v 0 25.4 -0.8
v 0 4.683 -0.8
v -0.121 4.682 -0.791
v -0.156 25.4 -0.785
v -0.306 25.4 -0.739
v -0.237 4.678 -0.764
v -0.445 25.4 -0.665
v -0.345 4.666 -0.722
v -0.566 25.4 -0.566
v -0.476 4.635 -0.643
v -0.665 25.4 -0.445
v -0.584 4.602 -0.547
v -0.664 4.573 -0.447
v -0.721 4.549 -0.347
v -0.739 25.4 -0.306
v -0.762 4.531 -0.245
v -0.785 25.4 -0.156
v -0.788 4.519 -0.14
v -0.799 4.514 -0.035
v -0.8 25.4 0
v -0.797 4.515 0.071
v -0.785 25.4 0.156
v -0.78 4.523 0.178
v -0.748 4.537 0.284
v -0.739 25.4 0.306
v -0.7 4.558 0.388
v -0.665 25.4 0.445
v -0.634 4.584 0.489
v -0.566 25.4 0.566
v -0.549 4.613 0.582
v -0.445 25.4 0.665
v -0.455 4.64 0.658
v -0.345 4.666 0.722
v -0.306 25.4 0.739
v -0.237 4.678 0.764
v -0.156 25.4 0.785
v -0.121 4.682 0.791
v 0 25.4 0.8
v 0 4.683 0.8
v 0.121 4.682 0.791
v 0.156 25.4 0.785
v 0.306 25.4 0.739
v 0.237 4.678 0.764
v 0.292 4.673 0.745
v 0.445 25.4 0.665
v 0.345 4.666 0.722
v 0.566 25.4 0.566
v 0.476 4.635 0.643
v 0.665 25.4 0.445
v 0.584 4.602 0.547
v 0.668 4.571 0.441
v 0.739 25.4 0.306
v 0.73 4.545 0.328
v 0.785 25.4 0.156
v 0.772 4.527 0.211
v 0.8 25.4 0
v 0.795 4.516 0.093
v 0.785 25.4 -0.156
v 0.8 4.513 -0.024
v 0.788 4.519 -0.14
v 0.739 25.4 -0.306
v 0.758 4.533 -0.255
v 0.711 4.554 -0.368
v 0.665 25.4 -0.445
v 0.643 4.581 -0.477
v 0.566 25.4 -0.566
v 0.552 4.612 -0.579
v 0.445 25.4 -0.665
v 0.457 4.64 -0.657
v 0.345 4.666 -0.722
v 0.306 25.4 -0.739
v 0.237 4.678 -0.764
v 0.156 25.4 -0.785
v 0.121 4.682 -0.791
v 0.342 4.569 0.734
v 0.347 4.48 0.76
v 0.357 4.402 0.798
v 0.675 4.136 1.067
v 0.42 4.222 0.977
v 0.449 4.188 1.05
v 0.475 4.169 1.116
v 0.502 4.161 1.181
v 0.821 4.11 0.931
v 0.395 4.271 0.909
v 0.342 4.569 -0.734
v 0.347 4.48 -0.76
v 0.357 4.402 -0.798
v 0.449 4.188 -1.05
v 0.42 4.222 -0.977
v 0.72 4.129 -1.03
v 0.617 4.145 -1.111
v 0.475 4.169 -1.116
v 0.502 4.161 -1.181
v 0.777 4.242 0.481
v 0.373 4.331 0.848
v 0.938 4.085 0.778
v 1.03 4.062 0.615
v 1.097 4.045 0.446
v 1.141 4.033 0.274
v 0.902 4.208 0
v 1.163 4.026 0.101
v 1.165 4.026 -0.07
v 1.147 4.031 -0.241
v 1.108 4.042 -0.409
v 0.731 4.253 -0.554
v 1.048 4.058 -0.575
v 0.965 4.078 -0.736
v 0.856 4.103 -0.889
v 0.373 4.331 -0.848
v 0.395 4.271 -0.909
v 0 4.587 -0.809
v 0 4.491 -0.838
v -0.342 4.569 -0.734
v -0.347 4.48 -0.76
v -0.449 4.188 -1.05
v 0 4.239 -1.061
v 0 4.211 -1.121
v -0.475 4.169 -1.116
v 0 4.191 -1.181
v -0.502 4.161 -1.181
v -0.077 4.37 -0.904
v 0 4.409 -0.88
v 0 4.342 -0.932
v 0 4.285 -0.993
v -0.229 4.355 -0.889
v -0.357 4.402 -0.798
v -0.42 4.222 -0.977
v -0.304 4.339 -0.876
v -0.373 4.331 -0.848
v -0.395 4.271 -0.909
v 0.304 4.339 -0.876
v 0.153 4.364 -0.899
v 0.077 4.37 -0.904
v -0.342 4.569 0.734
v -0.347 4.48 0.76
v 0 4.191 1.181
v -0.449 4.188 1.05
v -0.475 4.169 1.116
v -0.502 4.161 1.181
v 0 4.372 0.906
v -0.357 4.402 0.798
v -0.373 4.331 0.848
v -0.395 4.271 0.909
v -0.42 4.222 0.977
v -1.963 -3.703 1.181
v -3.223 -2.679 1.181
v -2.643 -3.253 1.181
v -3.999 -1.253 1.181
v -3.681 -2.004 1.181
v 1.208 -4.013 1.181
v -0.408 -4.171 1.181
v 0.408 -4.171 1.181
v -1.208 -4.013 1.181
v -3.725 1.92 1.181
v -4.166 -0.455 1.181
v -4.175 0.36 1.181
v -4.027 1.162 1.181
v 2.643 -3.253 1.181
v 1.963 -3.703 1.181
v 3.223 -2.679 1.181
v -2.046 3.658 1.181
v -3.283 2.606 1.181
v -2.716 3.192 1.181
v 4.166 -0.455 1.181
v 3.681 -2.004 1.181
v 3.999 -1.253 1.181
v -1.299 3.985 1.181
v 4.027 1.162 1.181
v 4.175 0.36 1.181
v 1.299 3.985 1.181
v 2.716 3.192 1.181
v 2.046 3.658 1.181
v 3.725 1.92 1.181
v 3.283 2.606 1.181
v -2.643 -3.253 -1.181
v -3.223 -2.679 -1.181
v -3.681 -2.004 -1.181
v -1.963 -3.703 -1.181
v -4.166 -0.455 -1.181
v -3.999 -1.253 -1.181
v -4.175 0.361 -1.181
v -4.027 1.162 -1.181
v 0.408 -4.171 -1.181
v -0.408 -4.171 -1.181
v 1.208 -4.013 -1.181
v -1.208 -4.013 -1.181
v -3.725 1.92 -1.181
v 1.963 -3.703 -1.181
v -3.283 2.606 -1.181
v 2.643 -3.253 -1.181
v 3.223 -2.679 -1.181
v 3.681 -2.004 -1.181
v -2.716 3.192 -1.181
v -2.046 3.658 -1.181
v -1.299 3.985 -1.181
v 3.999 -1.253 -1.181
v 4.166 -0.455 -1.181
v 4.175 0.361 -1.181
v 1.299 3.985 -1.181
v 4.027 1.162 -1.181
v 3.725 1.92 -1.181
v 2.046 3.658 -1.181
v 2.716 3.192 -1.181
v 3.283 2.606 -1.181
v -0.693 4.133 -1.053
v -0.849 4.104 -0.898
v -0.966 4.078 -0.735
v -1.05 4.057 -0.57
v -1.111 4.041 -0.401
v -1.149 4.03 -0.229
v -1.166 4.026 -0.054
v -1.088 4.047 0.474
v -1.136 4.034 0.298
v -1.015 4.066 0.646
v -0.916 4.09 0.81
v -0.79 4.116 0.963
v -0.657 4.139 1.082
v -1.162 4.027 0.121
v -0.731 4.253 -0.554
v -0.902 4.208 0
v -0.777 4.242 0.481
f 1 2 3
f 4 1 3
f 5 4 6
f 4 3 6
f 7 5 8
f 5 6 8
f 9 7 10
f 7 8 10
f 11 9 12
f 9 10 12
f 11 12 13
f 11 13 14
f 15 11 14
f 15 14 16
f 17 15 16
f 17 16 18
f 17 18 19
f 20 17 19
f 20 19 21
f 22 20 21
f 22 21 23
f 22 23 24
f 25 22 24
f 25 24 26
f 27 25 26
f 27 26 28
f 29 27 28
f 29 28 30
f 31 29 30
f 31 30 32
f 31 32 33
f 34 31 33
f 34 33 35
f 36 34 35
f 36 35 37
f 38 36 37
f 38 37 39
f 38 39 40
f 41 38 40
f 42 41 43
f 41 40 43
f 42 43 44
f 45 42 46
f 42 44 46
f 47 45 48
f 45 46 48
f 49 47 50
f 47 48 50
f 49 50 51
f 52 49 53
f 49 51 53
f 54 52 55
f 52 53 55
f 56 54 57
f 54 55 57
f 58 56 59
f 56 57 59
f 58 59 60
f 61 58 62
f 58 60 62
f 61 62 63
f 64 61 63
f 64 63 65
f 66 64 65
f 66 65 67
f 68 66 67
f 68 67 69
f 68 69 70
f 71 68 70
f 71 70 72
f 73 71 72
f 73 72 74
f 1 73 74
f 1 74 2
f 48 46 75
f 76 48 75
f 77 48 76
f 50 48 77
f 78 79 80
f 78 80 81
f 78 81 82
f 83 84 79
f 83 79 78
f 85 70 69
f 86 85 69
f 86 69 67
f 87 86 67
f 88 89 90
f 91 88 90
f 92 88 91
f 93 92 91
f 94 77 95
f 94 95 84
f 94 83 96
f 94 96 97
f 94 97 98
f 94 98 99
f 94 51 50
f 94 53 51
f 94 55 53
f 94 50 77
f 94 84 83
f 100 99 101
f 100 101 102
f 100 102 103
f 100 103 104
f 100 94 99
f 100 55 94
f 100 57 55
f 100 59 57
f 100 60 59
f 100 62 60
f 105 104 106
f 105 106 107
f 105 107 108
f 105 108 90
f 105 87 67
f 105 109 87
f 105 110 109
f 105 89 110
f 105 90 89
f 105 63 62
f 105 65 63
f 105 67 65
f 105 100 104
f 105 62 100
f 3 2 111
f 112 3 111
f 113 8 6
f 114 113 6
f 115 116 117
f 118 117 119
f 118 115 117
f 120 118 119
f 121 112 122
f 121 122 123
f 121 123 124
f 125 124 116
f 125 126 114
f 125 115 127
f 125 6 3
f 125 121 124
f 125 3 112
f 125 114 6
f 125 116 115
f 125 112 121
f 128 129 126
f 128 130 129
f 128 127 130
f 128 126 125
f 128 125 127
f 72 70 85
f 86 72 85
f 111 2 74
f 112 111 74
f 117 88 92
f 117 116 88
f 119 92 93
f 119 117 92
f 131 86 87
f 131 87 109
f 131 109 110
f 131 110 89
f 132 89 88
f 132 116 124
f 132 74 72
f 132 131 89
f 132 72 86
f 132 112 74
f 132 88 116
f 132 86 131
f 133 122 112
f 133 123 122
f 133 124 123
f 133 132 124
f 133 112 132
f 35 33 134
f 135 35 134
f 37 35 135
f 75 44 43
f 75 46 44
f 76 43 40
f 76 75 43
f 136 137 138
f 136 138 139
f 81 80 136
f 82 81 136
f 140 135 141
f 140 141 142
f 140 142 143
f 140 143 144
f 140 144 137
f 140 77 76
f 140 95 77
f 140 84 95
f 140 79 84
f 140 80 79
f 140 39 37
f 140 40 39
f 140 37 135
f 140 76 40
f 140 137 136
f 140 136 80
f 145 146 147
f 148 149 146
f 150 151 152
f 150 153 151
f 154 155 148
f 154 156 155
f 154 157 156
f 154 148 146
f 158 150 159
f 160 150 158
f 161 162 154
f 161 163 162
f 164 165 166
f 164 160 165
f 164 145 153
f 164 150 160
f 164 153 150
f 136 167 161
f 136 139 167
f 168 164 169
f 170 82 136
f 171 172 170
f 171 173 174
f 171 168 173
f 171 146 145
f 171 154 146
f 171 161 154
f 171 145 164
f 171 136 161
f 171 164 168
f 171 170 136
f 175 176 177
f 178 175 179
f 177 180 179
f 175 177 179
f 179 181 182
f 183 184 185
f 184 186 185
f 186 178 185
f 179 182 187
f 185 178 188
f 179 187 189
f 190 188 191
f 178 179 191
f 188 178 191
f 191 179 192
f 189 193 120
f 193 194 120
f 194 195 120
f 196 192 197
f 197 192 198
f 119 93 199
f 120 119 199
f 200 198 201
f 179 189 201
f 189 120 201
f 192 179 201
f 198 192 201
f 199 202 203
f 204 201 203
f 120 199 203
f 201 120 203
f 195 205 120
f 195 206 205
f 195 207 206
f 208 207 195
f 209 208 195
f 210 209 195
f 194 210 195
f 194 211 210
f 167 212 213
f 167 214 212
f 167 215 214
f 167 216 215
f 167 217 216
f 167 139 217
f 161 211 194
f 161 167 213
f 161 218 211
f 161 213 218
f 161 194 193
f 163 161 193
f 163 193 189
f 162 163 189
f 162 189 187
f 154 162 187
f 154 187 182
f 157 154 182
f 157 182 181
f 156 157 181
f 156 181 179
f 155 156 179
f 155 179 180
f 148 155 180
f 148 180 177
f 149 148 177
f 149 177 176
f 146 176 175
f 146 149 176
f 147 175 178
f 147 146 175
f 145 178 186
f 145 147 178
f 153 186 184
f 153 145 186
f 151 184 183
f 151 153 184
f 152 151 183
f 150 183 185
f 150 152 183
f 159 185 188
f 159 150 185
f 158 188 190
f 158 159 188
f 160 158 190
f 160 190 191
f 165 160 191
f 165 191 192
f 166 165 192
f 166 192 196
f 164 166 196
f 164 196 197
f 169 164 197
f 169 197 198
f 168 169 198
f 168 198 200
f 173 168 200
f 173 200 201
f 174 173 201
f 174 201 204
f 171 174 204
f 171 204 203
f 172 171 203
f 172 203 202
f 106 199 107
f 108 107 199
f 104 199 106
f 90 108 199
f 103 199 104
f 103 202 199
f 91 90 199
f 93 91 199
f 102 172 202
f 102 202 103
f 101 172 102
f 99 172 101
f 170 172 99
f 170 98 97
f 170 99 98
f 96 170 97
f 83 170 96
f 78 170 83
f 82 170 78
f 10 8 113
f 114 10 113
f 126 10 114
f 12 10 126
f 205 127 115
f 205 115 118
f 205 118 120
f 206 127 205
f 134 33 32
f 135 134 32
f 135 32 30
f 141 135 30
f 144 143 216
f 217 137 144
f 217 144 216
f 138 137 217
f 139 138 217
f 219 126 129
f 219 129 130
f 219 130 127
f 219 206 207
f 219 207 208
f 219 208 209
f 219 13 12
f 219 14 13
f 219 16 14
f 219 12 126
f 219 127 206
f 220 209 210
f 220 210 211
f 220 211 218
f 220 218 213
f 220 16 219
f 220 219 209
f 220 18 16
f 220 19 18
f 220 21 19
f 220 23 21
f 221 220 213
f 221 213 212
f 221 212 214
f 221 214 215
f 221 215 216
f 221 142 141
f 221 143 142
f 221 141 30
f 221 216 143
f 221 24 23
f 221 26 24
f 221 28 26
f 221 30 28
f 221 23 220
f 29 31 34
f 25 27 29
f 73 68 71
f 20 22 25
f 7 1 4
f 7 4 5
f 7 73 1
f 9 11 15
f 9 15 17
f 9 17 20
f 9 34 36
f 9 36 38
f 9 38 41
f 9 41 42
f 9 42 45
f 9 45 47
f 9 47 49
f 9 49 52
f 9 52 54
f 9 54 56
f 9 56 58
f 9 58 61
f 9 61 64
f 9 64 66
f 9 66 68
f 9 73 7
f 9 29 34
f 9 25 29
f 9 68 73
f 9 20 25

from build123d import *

# Parameters (mm, degrees)
SKETCH1_R           = 4.191
BOSS_EXTRUDE1_DEPTH = 1.1811
SKETCH2_R           = 0.8001
BOSS_EXTRUDE2_DEPTH = 25.4
FILLET1_R           = 0.508


with BuildPart() as part:
    # Sketch1 → Boss-Extrude1 (new, symmetric)
    with BuildSketch(Plane.XY):
        Circle(SKETCH1_R)
    extrude(amount=BOSS_EXTRUDE1_DEPTH, both=True)

    # Sketch2 → Boss-Extrude2 (add)
    with BuildSketch(Plane(origin=(0, 0, 0), x_dir=(1, 0, 0), z_dir=(0, 1, 0))):
        with Locations(Location((0, 0, 0), (0, 0, 90))):
            Circle(SKETCH2_R)
    extrude(amount=BOSS_EXTRUDE2_DEPTH)

    # Fillet1
    fillet1_edges = [part.edges().sort_by_distance(p)[0] for p in [
        (0, 4.191, 0.8001),
    ]]
    fillet(fillet1_edges, radius=FILLET1_R)


solid = part.part
